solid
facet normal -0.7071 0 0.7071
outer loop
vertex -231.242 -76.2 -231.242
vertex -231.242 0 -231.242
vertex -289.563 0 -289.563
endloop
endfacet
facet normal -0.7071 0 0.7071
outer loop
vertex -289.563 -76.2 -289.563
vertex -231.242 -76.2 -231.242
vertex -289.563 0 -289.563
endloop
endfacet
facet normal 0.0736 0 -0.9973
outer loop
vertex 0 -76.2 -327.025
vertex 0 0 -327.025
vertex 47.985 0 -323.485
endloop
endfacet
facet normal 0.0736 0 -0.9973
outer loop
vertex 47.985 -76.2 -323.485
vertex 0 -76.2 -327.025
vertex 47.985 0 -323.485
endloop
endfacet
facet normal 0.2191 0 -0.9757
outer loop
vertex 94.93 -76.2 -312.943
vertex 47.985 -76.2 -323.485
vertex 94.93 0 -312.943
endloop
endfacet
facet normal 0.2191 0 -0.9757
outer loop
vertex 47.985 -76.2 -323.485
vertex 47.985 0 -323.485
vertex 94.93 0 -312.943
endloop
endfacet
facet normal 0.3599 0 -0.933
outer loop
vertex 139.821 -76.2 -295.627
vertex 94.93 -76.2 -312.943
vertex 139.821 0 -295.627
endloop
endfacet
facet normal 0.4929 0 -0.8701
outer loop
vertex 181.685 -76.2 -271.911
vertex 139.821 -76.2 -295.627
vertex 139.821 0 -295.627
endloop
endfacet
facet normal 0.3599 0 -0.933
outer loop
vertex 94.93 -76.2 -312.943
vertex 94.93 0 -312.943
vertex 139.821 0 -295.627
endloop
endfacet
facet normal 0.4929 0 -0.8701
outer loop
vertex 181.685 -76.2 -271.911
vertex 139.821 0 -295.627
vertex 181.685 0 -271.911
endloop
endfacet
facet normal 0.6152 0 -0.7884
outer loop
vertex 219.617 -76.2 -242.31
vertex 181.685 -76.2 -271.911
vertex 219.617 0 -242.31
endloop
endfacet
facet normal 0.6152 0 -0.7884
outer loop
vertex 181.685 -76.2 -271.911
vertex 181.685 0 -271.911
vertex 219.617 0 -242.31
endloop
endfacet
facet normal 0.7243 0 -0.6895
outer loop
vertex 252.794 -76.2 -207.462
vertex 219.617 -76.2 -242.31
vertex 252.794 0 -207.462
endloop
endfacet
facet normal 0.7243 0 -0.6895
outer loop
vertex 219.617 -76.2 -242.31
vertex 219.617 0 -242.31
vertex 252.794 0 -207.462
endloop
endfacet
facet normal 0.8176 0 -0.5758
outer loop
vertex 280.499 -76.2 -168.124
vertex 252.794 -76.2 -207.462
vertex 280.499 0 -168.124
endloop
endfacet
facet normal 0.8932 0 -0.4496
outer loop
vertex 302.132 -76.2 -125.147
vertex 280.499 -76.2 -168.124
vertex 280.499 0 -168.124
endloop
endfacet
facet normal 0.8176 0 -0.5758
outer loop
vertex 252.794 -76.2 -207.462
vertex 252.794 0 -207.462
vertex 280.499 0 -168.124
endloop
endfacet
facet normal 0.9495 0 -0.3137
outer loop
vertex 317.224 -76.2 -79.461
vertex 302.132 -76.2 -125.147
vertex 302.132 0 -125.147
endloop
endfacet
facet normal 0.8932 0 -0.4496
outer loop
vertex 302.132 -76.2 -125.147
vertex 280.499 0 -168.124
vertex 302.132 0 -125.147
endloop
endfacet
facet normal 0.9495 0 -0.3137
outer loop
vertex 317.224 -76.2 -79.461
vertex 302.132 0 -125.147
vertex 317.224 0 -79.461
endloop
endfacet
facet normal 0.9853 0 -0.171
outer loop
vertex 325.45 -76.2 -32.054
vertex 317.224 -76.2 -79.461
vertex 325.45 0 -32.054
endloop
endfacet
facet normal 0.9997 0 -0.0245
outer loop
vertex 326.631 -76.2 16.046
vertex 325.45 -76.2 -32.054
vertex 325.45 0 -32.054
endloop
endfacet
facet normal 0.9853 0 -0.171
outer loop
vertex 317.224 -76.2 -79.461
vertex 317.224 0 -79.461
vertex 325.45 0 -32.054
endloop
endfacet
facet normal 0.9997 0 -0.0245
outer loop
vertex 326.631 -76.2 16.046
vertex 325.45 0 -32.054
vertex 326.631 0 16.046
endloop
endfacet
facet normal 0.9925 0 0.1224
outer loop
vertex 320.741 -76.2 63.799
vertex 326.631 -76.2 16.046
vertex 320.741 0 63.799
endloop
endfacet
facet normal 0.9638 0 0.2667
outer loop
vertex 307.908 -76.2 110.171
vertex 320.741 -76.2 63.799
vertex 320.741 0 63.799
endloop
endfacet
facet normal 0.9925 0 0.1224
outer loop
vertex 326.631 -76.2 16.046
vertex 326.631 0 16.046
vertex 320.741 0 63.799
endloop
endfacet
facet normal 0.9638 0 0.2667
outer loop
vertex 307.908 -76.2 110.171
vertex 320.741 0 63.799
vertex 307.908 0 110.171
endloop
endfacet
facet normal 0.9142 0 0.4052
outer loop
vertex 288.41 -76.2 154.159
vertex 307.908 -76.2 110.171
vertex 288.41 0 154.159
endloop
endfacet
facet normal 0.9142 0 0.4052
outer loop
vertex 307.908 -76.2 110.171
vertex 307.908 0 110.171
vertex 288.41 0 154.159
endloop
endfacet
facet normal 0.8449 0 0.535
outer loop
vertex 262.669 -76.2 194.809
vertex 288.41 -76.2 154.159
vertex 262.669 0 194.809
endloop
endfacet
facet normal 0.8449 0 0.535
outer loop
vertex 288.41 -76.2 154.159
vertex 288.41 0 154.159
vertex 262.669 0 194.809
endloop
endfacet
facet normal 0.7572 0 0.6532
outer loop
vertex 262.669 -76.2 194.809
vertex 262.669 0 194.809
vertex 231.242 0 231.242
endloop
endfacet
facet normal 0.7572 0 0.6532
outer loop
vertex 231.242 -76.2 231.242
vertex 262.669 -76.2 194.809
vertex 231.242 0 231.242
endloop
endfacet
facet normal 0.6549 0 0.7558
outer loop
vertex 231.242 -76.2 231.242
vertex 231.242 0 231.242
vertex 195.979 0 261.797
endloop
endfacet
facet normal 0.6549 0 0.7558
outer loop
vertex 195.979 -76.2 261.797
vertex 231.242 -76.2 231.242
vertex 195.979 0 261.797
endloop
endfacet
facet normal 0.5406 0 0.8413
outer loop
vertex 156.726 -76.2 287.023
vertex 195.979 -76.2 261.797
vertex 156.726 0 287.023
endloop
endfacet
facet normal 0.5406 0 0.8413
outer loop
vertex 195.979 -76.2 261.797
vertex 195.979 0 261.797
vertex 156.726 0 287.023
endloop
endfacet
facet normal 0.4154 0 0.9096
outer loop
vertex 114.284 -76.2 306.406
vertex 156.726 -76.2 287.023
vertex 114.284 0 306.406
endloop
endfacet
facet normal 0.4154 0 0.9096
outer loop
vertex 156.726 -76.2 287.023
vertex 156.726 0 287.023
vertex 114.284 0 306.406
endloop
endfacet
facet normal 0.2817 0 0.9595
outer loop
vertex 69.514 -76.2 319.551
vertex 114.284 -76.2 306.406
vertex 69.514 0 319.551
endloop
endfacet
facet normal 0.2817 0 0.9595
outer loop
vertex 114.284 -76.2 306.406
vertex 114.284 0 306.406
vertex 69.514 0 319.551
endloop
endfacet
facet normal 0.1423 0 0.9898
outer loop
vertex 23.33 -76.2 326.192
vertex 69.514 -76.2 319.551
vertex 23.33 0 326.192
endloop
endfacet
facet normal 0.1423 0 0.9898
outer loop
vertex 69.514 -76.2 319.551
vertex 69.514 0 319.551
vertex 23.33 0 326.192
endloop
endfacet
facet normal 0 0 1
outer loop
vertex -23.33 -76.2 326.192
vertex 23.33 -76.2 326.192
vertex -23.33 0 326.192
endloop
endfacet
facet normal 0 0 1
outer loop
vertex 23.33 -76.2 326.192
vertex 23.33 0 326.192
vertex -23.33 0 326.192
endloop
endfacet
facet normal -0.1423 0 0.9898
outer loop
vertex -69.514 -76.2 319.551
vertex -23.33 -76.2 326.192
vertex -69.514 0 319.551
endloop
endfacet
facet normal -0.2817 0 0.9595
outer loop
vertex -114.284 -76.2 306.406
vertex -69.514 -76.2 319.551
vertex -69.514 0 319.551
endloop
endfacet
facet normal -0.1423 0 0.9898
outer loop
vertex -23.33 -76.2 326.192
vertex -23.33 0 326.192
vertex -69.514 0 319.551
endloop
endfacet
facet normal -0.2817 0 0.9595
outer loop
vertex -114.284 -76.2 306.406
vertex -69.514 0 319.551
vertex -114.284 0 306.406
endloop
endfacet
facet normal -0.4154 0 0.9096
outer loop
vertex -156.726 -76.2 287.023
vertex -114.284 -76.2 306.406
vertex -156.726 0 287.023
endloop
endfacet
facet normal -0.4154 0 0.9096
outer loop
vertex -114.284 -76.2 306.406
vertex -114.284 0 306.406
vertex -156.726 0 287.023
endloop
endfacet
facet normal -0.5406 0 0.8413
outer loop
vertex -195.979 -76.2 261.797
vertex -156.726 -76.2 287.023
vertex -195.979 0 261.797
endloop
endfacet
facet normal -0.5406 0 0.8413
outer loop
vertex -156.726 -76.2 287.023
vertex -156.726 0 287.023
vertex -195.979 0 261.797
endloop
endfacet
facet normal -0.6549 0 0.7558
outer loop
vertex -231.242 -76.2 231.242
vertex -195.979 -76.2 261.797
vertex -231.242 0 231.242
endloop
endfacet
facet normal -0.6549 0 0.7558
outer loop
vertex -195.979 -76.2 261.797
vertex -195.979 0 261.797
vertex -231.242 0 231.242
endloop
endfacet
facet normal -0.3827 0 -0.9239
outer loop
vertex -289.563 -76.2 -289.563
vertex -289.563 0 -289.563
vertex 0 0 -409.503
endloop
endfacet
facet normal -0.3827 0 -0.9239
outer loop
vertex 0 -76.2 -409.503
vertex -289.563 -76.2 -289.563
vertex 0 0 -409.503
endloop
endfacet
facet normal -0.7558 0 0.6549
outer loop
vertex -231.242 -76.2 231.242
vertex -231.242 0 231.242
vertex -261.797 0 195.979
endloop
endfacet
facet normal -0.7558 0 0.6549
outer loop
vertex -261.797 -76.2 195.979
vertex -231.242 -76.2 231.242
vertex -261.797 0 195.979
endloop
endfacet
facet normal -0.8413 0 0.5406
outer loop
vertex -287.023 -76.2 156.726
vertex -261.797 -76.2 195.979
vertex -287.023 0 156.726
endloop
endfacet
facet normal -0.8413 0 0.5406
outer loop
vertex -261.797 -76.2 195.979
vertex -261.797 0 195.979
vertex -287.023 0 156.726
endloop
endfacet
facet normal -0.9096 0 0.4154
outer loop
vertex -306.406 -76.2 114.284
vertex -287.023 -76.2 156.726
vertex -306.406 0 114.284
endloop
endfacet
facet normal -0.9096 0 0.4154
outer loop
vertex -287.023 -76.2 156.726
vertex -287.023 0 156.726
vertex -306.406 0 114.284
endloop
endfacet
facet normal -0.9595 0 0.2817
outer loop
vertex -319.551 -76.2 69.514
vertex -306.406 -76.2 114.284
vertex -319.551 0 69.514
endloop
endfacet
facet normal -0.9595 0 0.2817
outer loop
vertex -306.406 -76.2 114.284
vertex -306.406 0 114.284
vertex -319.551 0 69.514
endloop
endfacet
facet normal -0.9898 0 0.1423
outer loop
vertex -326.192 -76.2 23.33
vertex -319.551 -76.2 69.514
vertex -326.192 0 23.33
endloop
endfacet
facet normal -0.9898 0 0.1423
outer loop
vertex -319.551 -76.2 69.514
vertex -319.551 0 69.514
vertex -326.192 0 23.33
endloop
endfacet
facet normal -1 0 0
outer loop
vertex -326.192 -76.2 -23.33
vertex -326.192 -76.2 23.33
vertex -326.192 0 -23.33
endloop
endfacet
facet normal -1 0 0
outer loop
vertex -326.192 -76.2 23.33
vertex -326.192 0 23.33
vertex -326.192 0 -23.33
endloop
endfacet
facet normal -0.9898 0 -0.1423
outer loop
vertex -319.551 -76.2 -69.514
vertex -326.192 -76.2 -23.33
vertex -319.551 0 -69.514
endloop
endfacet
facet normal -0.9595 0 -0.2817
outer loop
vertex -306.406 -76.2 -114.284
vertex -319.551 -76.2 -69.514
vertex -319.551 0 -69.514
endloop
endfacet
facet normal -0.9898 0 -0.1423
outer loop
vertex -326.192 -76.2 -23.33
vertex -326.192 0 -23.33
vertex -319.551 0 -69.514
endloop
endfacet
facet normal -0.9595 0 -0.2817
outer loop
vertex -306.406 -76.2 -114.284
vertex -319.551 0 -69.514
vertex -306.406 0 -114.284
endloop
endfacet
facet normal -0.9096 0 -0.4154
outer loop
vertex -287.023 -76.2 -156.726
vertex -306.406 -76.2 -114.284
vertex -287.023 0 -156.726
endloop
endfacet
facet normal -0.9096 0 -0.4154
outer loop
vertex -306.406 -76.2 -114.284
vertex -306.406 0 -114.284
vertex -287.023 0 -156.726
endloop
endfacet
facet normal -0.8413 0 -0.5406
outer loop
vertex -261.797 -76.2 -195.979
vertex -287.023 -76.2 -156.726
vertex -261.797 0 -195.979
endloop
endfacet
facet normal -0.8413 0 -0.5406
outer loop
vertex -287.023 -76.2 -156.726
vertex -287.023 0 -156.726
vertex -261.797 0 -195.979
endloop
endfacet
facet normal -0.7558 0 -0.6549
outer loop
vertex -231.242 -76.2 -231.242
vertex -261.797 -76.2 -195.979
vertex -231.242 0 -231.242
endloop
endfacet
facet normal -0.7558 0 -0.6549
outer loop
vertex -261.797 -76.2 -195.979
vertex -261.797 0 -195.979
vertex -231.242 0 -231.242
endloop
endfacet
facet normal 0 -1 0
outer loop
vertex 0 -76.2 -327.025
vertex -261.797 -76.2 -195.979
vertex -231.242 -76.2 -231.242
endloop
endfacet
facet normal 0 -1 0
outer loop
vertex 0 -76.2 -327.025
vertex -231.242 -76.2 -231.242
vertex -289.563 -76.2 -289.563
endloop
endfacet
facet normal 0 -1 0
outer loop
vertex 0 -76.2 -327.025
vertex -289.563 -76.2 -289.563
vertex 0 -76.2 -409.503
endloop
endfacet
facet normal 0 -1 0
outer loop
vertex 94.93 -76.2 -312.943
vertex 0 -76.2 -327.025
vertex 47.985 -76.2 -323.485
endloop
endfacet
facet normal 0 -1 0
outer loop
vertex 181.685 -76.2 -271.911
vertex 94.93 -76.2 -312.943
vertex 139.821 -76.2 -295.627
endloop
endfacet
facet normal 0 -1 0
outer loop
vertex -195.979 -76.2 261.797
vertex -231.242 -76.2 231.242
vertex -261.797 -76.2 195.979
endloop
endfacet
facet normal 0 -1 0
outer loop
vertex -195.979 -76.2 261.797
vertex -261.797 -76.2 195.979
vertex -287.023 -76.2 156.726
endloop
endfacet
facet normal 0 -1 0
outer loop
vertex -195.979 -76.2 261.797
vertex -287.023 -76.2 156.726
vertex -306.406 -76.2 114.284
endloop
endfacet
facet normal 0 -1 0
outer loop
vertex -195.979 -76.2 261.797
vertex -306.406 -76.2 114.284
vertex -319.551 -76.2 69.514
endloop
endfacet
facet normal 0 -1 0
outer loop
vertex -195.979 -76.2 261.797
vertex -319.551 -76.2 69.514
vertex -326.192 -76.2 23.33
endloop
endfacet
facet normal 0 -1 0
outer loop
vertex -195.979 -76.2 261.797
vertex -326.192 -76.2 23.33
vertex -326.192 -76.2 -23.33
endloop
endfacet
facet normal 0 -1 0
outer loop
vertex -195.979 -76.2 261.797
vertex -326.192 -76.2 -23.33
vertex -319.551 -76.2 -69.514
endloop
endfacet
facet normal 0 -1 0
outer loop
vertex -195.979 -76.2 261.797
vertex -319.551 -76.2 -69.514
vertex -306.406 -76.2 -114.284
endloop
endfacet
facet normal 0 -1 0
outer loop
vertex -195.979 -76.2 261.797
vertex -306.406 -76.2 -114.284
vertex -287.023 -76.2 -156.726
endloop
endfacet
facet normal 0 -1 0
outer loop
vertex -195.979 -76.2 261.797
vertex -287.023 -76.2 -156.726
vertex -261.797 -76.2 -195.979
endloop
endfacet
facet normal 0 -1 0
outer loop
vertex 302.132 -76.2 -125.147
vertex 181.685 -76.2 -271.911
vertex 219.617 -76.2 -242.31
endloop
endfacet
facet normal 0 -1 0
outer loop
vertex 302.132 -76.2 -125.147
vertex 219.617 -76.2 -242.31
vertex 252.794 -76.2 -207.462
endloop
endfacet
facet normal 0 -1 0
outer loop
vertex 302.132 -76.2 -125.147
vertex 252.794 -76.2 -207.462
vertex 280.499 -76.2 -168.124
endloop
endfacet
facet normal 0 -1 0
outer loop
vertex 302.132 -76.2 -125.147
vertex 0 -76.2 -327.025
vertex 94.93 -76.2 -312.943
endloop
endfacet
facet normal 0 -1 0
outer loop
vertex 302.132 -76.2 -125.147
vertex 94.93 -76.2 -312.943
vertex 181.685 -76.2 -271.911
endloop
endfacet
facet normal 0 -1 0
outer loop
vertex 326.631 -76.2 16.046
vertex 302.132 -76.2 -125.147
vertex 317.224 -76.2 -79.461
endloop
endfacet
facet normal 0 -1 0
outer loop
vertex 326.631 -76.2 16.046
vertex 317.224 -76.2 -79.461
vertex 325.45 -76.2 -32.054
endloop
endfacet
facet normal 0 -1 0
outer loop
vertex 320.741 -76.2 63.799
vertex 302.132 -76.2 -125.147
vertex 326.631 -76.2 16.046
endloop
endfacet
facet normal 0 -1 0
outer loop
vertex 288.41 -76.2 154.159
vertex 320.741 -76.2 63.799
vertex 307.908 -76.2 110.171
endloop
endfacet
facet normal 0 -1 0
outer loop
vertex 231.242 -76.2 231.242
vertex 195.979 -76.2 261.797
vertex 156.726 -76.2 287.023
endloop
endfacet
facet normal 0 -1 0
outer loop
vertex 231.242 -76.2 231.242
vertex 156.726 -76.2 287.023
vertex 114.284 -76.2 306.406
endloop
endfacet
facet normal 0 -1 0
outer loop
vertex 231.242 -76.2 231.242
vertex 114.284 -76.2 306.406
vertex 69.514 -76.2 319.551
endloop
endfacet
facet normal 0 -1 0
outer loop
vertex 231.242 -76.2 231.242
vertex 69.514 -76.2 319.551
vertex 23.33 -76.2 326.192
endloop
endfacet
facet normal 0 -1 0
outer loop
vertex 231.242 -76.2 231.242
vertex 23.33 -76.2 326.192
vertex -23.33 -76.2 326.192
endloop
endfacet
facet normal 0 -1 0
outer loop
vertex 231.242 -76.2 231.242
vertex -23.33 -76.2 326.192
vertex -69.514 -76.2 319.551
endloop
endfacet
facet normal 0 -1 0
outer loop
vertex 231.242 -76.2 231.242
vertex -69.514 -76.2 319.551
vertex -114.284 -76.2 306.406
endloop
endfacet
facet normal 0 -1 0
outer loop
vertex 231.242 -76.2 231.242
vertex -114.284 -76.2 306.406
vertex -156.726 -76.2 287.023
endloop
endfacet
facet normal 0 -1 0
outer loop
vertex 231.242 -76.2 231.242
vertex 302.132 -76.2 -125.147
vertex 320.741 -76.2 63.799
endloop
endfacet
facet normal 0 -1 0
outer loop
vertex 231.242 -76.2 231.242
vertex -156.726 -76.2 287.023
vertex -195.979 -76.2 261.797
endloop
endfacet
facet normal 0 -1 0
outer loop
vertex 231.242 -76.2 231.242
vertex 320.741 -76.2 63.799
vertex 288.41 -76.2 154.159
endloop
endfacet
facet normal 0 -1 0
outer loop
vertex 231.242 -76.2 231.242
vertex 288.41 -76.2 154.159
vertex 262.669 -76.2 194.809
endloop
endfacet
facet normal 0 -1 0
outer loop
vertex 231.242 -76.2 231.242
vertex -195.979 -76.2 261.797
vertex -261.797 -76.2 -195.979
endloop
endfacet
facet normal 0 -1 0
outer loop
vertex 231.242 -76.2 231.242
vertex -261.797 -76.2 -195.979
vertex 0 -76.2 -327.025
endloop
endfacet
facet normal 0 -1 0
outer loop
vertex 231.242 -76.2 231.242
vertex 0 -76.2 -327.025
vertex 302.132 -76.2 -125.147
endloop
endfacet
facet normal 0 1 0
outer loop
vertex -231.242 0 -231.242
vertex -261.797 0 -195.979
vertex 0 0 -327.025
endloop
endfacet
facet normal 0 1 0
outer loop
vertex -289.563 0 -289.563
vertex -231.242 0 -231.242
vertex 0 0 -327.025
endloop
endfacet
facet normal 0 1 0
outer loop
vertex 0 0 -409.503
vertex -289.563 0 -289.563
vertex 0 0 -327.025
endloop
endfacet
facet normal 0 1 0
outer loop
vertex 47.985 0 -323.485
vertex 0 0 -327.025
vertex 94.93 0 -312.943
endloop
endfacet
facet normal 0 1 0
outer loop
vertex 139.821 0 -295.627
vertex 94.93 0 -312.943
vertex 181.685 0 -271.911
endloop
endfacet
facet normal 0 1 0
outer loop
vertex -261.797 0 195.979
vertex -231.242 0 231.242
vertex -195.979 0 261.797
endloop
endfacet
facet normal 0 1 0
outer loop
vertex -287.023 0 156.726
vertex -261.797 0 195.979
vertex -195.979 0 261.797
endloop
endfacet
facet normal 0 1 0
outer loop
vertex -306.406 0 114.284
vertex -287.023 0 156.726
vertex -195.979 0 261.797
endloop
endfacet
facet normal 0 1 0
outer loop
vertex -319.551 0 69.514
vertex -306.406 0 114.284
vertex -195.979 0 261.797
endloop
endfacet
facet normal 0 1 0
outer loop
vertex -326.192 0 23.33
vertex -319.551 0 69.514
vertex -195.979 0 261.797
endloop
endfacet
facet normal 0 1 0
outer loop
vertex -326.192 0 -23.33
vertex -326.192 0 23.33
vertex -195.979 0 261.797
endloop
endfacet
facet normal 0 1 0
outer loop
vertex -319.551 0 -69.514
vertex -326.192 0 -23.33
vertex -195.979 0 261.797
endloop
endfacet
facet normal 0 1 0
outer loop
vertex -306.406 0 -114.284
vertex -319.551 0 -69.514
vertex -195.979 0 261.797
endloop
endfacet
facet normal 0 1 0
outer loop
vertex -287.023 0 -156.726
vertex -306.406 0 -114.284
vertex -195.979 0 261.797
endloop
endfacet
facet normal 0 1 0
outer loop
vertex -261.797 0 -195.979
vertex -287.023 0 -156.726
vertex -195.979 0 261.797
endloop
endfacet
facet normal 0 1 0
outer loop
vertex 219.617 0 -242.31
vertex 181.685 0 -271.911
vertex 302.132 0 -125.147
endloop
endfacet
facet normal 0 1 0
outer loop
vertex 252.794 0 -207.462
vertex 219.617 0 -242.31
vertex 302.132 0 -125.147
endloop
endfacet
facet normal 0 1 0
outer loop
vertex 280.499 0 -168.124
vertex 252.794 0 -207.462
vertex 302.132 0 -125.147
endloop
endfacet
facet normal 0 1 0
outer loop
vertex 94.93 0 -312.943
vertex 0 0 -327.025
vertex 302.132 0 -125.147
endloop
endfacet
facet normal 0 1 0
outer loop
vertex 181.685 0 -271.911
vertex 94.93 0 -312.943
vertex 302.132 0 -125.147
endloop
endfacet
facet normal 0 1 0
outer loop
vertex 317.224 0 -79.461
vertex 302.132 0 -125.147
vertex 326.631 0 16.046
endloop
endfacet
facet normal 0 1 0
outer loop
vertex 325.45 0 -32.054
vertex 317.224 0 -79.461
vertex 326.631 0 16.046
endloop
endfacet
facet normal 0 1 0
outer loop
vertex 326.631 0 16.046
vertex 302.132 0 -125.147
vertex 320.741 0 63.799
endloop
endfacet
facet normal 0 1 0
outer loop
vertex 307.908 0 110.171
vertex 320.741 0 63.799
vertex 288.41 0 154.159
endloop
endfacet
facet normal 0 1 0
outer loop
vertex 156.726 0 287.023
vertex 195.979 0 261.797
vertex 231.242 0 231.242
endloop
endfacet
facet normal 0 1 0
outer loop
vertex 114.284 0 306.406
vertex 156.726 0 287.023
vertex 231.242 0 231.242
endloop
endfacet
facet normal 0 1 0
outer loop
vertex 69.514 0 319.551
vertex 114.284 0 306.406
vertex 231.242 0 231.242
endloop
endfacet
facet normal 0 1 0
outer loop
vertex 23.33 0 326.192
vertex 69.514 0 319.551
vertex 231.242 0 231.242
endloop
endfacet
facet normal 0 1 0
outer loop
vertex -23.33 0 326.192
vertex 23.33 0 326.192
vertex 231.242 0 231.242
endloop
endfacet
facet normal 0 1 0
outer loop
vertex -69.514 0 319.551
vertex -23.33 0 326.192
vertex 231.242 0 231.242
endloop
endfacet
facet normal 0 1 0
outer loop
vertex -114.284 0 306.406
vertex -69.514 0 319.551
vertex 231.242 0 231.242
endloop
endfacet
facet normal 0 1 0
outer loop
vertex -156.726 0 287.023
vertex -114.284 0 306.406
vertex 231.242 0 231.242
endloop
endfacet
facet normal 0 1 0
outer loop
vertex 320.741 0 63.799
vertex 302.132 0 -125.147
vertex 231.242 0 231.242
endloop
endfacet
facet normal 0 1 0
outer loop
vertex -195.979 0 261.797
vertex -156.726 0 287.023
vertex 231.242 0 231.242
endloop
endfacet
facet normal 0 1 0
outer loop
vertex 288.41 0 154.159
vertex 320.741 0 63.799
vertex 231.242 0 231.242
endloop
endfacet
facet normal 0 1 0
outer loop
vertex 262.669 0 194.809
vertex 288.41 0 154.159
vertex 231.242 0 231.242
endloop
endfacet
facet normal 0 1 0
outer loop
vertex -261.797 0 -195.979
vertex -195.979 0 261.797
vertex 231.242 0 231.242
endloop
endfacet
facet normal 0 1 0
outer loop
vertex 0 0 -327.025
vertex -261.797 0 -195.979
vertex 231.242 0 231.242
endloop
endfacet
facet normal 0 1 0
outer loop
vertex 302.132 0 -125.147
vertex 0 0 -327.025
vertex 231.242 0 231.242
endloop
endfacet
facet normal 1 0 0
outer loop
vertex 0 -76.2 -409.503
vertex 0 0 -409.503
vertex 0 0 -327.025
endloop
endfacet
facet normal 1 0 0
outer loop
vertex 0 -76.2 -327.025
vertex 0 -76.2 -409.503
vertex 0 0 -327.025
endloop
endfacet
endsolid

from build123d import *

# Parameters (mm, degrees)
F1_DEPTH = 76.2


with BuildPart() as f1:
    # F0 (on Front) → F1 (new body)
    with BuildSketch(Plane.XZ):
        with BuildLine():
            Line((231.2415951175, 231.2415951175), (327.025, 0))
            ThreePointArc((327.025, 0), (302.1317041195, 125.1470494692), (231.2415951175, 231.2415951175))
        make_face()
        Polygon((0, 0), (327.025, 0), (231.2415951175, 231.2415951175), align=None)
        with BuildLine():
            ThreePointArc((231.2415951175, -231.2415951175), (302.1317041195, -125.1470494692), (327.025, 0))
            Line((327.025, 0), (231.2415951175, -231.2415951175))
        make_face()
        Polygon((231.2415951175, -231.2415951175), (327.025, 0), (0, 0), align=None)
        with BuildLine():
            Line((0, 327.025), (231.2415951175, 231.2415951175))
            ThreePointArc((231.2415951175, 231.2415951175), (125.1470494692, 302.1317041195), (0, 327.025))
        make_face()
        Polygon((0, 0), (231.2415951175, 231.2415951175), (0, 327.025), align=None)
        with BuildLine():
            ThreePointArc((0, -327.025), (125.1470494692, -302.1317041195), (231.2415951175, -231.2415951175))
            Line((231.2415951175, -231.2415951175), (0, -327.025))
        make_face()
        Polygon((0, -327.025), (231.2415951175, -231.2415951175), (0, 0), align=None)
        Polygon((0, -327.025), (0, 0), (-231.2415951175, -231.2415951175), align=None)
        Polygon((-231.2415951175, 231.2415951175), (0, 0), (0, 327.025), align=None)
        Polygon((-327.025, 0), (0, 0), (-231.2415951175, 231.2415951175), align=None)
        Polygon((-231.2415951175, -231.2415951175), (0, 0), (-327.025, 0), align=None)
        with BuildLine():
            Line((-231.2415951175, 231.2415951175), (0, 327.025))
            ThreePointArc((0, 327.025), (-125.1470494692, 302.1317041195), (-231.2415951175, 231.2415951175))
        make_face()
        with BuildLine():
            Line((0, -409.5032856623), (0, -327.025))
            ThreePointArc((0, -327.025), (-125.1470494692, -302.1317041195), (-231.2415951175, -231.2415951175))
            Line((-231.2415951175, -231.2415951175), (-289.56255021, -289.56255021))
            Line((-289.56255021, -289.56255021), (0, -409.5032856623))
        make_face()
        with BuildLine():
            ThreePointArc((-231.2415951175, -231.2415951175), (-125.1470494692, -302.1317041195), (0, -327.025))
            Line((0, -327.025), (-231.2415951175, -231.2415951175))
        make_face()
        with BuildLine():
            ThreePointArc((-327.025, 0), (-302.1317041195, -125.1470494692), (-231.2415951175, -231.2415951175))
            Line((-231.2415951175, -231.2415951175), (-327.025, 0))
        make_face()
        with BuildLine():
            Line((-327.025, 0), (-231.2415951175, 231.2415951175))
            ThreePointArc((-231.2415951175, 231.2415951175), (-302.1317041195, 125.1470494692), (-327.025, 0))
        make_face()
    extrude(amount=F1_DEPTH)


solid = f1.part
